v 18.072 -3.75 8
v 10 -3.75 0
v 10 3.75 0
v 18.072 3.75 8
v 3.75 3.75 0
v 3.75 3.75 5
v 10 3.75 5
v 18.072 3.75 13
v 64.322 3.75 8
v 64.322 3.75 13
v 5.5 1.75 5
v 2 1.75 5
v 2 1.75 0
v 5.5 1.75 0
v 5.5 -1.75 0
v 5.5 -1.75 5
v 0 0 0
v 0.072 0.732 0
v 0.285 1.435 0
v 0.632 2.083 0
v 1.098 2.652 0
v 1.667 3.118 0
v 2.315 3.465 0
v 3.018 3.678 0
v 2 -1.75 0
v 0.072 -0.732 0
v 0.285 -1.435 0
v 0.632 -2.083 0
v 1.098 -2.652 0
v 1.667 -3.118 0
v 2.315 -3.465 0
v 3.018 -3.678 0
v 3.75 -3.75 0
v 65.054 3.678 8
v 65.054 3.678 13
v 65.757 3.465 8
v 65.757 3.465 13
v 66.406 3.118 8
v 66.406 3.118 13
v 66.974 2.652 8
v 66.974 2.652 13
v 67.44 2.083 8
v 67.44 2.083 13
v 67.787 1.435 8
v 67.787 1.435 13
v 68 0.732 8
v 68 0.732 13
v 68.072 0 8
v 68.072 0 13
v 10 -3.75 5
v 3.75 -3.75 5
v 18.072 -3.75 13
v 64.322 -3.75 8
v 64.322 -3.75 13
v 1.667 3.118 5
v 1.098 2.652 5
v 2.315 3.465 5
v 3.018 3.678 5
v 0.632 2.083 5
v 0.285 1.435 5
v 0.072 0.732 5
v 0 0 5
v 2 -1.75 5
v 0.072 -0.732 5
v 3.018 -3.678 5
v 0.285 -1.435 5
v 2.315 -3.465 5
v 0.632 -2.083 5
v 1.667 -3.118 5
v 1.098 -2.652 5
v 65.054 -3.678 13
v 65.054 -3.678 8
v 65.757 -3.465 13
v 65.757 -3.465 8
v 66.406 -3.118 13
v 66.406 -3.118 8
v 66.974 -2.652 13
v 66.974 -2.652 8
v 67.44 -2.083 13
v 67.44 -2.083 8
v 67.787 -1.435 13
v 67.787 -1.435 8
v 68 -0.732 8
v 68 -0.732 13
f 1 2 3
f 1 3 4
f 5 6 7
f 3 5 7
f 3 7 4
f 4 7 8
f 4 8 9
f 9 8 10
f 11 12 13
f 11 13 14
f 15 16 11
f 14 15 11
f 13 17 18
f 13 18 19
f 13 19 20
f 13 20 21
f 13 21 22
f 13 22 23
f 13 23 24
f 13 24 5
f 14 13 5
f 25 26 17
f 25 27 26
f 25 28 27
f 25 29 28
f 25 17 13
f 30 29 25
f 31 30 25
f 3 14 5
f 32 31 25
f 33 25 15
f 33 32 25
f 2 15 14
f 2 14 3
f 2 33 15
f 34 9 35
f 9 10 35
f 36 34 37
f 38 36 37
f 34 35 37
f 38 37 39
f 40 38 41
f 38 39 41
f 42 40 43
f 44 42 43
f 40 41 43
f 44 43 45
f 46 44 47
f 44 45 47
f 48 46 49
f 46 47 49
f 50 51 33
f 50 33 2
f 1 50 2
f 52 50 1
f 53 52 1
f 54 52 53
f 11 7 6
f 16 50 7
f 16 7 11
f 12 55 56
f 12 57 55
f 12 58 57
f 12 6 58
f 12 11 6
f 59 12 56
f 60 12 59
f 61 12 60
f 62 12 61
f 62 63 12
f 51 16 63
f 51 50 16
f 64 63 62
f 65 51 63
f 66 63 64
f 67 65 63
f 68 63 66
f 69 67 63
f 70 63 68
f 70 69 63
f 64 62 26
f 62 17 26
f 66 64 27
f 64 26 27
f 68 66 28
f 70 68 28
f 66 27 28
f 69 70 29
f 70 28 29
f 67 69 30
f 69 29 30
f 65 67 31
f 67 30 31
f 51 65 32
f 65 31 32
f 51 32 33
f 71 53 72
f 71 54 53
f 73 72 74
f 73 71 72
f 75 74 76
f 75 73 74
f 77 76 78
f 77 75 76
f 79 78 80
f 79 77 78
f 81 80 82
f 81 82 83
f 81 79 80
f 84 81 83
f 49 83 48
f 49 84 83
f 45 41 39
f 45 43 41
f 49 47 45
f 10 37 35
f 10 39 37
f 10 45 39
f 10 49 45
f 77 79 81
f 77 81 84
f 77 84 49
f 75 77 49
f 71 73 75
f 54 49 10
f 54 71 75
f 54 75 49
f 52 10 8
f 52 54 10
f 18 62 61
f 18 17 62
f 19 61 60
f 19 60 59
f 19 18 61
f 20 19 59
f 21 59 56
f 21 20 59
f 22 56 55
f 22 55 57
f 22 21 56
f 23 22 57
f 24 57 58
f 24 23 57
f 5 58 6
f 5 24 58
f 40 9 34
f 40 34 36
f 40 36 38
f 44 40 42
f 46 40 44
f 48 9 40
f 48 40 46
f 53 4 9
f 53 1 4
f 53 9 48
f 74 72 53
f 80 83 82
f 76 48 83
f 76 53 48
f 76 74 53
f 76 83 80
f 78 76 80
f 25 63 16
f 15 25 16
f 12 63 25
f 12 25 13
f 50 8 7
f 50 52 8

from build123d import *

# Parameters (mm, degrees)
F1_DEPTH      = 3.75
F1_DEPTH_BACK = 3.75
F2_W          = 3.5
F2_H          = 3.5
F3_DEPTH      = 5.001
F4_R          = 3.74999
F5_R          = 3.74999


# Not quite as in the source:
# - a fillet or chamfer is up to 0.001 mm smaller than in the source, because OpenCascade refuses the exact size


with BuildPart() as f1:
    # F0 (on Front) → F1 (new body, two sides)
    with BuildSketch(Plane.XZ) as f1_sk:
        Polygon((0, 5), (0, 0), (10, 0), (18.0723418804, 8), (68.0723418804, 8), (68.0723418804, 13), (18.0723418804, 13), (10, 5), align=None)
    extrude(amount=F1_DEPTH)
    extrude(f1_sk.sketch, amount=-F1_DEPTH_BACK)

    # F2 (on face) → F3 (cut, through all)
    with BuildSketch(Plane.XY.offset(5)):
        with Locations((3.75, 0)):
            Rectangle(F2_W, F2_H)
    extrude(amount=-F3_DEPTH, mode=Mode.SUBTRACT)

    # F4 (radius 3.75 in the source; OpenCascade refuses exactly that, so slightly less here)
    f4_edges = [f1.edges().sort_by_distance(p)[0] for p in [
        (0, -3.75, 2.5),
        (0, 3.75, 2.5),
    ]]
    fillet(f4_edges, radius=F4_R)

    # F5 (radius 3.75 in the source; OpenCascade refuses exactly that, so slightly less here)
    f5_edges = [f1.edges().sort_by_distance(p)[0] for p in [
        (68.072342, -3.75, 10.5),
        (68.072342, 3.75, 10.5),
    ]]
    fillet(f5_edges, radius=F5_R)


solid = f1.part
